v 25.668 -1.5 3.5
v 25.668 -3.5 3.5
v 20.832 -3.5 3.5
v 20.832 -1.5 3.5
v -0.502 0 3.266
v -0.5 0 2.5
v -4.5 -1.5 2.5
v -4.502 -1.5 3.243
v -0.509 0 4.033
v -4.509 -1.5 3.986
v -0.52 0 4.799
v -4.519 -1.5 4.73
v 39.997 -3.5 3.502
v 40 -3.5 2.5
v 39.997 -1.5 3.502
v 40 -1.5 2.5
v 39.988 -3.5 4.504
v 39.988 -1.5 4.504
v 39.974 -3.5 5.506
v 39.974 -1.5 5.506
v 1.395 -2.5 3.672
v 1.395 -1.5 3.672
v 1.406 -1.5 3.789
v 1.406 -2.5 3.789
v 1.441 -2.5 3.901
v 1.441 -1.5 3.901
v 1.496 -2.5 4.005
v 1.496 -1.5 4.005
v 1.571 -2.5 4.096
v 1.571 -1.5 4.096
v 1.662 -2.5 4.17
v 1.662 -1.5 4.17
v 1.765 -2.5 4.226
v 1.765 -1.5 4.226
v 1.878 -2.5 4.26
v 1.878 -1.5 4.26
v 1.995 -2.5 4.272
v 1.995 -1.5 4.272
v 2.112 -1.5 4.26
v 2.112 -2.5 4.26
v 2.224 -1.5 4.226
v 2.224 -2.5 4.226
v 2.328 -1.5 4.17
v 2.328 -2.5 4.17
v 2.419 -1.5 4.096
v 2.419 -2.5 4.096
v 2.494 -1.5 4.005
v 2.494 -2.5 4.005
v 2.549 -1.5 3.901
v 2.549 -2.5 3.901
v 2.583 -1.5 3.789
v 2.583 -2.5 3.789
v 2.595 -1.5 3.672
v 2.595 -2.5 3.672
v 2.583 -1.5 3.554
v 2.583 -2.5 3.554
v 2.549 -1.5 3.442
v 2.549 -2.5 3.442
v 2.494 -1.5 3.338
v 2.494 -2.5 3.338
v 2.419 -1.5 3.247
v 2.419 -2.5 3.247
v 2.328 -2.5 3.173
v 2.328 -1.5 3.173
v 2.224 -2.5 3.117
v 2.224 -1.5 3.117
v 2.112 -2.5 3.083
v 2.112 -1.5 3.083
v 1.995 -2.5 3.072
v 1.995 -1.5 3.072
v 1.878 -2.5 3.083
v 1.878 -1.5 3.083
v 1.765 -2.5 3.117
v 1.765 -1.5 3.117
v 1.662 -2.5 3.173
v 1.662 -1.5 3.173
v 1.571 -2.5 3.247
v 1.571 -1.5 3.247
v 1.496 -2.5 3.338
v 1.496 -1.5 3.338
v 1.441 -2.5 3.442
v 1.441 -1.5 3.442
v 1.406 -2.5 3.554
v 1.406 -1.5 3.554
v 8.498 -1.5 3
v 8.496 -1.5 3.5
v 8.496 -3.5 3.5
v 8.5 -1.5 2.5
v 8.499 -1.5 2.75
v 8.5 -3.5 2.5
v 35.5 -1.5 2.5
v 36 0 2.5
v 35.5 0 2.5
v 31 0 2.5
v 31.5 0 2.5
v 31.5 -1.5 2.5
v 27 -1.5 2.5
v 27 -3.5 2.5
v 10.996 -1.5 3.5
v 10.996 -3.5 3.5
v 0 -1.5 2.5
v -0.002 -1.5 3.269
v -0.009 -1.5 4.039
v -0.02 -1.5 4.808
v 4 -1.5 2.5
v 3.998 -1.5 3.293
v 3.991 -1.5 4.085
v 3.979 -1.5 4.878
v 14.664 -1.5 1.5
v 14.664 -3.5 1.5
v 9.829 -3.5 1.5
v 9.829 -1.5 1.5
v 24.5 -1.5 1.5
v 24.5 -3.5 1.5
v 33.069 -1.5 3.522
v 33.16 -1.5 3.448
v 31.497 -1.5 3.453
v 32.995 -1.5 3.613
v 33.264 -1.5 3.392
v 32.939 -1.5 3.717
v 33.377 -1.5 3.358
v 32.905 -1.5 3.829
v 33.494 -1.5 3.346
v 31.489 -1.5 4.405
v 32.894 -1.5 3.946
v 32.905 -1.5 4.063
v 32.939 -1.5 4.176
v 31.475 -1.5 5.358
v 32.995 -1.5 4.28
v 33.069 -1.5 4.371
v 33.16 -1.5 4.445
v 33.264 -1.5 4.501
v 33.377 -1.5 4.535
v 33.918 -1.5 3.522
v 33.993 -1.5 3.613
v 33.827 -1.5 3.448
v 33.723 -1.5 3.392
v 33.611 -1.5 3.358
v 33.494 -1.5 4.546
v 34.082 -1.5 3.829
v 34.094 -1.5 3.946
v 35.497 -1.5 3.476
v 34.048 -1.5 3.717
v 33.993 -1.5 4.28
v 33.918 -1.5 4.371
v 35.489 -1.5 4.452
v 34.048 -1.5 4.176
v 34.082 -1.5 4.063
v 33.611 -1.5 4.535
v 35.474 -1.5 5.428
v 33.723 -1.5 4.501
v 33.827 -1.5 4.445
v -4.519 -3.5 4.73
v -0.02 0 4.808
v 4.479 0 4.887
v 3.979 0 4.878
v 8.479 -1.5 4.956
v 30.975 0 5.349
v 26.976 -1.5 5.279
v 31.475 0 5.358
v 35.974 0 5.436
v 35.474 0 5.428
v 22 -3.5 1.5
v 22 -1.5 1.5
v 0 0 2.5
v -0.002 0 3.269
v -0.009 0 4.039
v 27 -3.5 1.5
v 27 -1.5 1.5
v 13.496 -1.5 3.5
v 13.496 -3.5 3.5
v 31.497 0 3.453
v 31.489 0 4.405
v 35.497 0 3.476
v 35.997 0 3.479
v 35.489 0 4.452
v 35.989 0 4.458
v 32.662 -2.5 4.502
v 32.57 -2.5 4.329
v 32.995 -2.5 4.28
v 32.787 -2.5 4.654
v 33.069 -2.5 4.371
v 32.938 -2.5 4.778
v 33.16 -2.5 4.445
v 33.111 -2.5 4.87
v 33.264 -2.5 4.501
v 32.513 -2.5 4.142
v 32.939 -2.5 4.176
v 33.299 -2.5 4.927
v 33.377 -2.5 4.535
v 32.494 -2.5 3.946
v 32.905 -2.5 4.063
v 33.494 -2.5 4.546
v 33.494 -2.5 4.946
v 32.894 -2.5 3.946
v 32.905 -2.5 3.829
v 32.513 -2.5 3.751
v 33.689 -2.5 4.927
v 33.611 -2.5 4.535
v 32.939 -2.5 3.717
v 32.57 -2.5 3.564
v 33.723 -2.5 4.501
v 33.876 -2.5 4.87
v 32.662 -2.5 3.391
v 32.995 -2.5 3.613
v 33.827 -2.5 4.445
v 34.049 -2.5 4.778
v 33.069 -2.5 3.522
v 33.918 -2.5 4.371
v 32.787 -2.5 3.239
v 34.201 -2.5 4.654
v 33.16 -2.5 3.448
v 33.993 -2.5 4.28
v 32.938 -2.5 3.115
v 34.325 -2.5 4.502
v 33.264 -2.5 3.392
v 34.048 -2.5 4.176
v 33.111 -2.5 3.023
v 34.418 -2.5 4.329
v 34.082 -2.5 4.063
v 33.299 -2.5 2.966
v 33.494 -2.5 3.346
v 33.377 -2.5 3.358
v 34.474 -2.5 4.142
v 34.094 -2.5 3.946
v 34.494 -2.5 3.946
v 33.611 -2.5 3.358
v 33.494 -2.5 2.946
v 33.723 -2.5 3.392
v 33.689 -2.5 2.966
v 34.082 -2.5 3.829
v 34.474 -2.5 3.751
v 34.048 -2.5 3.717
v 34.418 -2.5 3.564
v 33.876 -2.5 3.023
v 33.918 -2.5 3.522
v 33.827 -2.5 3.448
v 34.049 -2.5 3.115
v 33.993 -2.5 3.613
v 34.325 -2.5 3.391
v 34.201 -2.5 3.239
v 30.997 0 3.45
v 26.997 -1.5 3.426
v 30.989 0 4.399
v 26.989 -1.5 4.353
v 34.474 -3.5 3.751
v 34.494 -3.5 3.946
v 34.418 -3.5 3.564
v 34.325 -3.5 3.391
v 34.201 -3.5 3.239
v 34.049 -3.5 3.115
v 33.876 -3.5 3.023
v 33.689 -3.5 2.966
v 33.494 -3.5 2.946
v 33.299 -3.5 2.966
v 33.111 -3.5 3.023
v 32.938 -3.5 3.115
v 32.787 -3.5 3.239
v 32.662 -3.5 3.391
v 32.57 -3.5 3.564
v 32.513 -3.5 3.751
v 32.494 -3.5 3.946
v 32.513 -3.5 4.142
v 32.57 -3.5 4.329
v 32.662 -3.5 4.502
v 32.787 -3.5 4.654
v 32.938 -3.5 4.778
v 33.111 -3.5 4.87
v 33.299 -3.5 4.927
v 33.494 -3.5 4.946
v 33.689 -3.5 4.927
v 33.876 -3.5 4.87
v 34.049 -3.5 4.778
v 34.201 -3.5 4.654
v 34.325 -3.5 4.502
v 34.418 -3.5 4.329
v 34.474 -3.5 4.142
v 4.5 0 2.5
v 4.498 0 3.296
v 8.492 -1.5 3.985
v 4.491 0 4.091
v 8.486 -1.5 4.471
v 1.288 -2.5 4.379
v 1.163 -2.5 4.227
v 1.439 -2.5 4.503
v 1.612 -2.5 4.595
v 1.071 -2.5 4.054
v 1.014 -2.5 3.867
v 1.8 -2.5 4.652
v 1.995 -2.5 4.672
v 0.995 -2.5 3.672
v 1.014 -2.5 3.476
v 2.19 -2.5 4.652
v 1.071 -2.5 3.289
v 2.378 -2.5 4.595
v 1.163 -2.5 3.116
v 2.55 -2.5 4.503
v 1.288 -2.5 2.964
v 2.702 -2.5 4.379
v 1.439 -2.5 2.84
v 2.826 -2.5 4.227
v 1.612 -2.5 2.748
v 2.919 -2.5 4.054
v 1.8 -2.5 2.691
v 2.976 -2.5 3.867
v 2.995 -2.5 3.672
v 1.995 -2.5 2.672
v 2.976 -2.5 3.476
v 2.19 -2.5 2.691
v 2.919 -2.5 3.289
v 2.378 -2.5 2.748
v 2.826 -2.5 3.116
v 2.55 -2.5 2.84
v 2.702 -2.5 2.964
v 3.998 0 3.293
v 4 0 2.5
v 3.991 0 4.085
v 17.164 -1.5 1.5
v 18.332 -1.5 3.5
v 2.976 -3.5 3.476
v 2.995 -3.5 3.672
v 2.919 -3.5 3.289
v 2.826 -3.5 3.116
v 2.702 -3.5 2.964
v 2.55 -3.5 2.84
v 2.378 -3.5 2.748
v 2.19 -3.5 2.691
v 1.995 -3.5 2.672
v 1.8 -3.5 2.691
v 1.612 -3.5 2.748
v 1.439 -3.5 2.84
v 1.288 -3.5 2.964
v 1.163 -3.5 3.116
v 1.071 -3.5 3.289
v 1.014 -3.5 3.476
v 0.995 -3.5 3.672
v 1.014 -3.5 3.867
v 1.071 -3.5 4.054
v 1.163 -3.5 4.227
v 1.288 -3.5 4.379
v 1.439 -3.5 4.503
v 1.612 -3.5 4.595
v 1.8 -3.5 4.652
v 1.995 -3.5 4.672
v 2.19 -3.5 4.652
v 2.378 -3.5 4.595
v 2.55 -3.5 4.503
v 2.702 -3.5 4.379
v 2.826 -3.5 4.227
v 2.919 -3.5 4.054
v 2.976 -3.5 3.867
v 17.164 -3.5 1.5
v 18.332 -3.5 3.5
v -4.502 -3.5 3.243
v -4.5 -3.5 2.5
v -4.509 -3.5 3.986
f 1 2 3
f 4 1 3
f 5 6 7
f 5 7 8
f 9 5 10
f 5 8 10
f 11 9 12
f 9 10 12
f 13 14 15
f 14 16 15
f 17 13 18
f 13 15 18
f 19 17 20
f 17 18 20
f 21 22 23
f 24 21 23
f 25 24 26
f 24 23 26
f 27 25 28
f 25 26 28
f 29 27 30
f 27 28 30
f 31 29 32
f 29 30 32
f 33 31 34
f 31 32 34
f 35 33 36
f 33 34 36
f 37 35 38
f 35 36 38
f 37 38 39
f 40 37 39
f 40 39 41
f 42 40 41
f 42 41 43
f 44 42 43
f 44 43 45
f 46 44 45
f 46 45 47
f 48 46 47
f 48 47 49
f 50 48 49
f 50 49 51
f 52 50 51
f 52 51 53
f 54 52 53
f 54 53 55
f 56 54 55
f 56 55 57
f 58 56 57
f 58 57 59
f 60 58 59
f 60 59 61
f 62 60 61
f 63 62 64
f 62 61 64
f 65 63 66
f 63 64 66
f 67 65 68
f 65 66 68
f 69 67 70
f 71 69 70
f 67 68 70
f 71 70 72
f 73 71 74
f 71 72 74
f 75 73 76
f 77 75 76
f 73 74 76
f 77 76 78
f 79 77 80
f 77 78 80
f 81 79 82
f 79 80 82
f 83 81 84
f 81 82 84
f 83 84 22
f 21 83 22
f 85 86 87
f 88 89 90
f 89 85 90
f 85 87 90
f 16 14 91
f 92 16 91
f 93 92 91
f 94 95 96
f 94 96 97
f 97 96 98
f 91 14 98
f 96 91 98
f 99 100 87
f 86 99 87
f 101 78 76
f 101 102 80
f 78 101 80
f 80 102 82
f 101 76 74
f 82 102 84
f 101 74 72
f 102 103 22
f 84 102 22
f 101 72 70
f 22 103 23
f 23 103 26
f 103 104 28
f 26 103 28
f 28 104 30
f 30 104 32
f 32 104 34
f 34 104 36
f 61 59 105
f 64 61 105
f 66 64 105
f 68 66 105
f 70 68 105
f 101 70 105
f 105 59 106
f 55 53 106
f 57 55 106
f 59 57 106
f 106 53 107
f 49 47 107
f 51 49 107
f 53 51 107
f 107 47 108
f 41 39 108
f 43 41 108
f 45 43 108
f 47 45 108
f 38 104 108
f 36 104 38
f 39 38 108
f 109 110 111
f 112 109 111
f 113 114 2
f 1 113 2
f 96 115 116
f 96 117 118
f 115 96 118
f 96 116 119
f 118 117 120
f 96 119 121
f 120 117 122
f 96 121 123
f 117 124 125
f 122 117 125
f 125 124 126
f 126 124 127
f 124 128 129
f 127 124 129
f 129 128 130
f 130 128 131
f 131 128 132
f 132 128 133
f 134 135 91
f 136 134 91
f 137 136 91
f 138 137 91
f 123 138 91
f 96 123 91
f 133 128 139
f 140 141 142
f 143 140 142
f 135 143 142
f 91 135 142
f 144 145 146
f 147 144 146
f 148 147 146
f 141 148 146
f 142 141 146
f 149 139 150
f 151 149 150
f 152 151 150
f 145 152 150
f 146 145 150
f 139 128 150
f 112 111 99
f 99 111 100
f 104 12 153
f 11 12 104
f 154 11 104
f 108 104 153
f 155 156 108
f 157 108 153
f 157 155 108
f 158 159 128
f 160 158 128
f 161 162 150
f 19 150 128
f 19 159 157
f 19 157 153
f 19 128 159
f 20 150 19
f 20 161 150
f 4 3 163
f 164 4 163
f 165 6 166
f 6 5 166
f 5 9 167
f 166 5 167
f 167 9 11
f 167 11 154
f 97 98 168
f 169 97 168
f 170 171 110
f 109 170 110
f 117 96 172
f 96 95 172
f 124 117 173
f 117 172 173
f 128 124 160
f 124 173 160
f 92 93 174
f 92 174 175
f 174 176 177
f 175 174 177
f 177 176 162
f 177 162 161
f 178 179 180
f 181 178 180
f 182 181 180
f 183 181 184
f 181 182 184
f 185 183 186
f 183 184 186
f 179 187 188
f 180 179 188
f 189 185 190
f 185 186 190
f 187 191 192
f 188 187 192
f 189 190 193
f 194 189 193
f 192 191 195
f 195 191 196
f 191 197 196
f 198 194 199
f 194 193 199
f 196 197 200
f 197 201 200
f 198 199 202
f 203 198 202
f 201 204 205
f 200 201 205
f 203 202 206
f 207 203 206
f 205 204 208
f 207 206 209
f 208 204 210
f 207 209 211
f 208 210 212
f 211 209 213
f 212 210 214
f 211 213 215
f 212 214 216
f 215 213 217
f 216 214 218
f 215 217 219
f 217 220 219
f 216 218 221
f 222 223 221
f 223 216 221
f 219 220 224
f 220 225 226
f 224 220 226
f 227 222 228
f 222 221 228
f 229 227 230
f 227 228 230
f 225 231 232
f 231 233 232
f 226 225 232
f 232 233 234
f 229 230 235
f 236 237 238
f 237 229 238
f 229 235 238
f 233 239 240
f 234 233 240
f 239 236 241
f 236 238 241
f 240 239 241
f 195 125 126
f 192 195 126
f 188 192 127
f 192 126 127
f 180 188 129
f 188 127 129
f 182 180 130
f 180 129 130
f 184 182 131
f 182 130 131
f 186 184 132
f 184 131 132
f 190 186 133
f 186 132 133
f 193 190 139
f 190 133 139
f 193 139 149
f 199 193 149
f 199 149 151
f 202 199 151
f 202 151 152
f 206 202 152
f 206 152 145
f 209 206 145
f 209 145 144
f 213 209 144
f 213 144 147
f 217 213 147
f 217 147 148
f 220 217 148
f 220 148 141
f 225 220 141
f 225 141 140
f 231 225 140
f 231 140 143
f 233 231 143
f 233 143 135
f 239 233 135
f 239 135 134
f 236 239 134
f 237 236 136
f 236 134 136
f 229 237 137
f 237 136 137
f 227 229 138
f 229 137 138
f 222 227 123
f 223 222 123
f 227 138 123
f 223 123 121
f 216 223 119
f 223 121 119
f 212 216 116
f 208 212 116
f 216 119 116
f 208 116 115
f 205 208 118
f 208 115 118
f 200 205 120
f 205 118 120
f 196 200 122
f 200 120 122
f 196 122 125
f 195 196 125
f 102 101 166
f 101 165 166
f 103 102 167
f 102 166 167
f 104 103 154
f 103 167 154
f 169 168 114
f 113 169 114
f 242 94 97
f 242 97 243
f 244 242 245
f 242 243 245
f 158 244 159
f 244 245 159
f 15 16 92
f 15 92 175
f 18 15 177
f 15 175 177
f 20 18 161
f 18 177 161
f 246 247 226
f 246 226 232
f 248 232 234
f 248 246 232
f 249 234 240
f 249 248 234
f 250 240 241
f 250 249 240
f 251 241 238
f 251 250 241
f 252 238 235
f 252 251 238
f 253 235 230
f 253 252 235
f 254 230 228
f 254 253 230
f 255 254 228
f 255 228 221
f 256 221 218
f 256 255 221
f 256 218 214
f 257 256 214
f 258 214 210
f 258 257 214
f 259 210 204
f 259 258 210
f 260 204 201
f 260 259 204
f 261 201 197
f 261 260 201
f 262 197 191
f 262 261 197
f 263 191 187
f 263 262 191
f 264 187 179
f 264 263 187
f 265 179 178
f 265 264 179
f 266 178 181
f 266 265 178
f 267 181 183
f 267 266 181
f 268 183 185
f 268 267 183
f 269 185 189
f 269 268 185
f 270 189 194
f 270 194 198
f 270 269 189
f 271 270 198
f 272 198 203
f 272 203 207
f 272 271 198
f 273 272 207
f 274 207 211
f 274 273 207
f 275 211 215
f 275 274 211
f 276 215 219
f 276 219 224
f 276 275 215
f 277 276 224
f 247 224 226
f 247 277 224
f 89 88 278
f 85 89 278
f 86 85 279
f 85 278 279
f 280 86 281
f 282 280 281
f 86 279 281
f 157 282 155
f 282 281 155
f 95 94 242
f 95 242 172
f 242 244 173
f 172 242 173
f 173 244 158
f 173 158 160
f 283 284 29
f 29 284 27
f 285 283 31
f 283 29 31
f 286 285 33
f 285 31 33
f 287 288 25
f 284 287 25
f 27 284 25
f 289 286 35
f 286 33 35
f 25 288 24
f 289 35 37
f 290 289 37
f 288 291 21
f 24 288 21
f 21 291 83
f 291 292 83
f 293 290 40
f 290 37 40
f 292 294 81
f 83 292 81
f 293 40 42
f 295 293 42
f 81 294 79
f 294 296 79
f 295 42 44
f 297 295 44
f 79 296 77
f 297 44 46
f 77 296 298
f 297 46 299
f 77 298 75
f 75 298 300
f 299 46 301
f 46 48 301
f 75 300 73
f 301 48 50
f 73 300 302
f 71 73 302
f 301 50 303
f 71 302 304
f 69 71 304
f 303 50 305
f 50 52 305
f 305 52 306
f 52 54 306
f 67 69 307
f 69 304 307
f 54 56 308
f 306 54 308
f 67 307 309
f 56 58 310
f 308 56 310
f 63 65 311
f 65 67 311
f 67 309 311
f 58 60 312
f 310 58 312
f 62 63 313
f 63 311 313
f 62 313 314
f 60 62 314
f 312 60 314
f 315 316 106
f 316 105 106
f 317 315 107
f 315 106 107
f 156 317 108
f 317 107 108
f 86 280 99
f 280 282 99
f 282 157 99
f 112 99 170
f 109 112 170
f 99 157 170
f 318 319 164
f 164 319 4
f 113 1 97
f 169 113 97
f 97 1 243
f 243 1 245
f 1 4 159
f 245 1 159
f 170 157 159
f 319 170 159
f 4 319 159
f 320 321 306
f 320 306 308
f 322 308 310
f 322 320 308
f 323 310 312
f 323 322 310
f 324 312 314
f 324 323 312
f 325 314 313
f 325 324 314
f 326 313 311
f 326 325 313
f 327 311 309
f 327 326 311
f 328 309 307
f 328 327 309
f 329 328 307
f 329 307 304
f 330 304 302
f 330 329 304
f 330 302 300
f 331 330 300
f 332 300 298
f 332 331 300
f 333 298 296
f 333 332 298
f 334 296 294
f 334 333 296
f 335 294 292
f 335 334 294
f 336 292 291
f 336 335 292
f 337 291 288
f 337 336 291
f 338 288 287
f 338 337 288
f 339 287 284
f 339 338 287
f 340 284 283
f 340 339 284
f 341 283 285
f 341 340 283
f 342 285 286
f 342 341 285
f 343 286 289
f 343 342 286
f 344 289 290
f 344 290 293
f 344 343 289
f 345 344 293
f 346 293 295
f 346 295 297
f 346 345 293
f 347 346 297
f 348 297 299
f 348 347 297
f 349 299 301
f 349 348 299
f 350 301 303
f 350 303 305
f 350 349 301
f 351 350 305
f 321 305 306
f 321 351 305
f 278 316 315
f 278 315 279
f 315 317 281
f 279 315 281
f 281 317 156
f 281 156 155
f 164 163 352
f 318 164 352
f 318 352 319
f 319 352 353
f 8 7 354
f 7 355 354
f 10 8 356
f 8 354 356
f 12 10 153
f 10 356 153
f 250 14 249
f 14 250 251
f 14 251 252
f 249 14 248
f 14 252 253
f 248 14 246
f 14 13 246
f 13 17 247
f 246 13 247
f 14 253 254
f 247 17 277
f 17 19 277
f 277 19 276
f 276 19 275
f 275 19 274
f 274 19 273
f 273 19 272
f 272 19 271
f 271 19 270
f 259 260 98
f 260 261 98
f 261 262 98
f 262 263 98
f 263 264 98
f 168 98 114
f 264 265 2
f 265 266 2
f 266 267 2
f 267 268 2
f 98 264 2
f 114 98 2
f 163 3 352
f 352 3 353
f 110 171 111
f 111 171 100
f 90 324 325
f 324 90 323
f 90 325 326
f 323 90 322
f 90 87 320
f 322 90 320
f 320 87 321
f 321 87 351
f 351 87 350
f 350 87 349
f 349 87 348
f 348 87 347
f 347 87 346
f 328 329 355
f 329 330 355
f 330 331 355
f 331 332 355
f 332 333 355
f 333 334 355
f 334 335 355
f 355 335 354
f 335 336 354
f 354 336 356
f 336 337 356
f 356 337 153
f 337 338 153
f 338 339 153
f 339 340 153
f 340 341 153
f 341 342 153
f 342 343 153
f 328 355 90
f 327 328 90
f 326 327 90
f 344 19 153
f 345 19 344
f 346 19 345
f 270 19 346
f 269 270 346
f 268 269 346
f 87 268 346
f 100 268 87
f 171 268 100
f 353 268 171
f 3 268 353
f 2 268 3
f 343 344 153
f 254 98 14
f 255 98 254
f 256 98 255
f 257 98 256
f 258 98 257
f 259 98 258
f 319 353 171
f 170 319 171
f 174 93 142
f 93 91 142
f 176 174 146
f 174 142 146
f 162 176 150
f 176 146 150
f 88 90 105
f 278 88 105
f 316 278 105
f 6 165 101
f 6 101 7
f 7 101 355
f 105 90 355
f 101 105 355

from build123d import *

# Parameters (mm, degrees)
EXTRUDE_1_DEPTH          = 2.5
SKETCH_5_R               = 0.6
CUT_EXTRUDE_1_DEPTH      = 19.036421485
CUT_EXTRUDE_START        = -2
SKETCH_5_3_R             = 1
CUT_EXTRUDE_2_DEPTH      = 1
REVOLVE_1_ANGLE          = 1
SKETCH_9_R               = 0.6
CUT_EXTRUDE_3_DEPTH      = 41.426698916
SKETCH_9_3_R             = 1
CUT_EXTRUDE_4_DEPTH      = 1
CUT_EXTRUDE_9_DEPTH      = 41.426698916
CUT_EXTRUDE_9_DEPTH_BACK = 41.426698916


with BuildPart() as part:
    # 草图4 → 凸台-拉伸1 (new body)
    with BuildSketch(Plane.XY):
        Polygon((8.5, -1.5), (17.75, -1.5), (17.75, -3.5), (-4.5, -3.5), (-4.5, -1.5), (-0.5, 0), (0, 0), (0, -1.5), (4, -1.5), (4, 0), (4.5, 0), align=None)
    extrude(amount=EXTRUDE_1_DEPTH)

    # 草图5 → 切除-拉伸1 (cut, through all)
    with BuildSketch(Plane(origin=(0, -1.5, 0), x_dir=(1, 0, 0), z_dir=(0, 1, 0))):
        with Locations(Location((2, -1.25, 0), (0, 0, 270))):
            Circle(SKETCH_5_R)
    extrude(amount=-CUT_EXTRUDE_1_DEPTH, mode=Mode.SUBTRACT)

    # 草图5<3> → 切除-拉伸2 (cut)
    with BuildSketch(Plane(origin=(0, -1.5, 0), x_dir=(1, 0, 0), z_dir=(0, 1, 0)).offset(CUT_EXTRUDE_START)):
        with Locations((2, -1.25)):
            Circle(SKETCH_5_3_R)
    extrude(amount=CUT_EXTRUDE_2_DEPTH, mode=Mode.SUBTRACT)

    # 镜向1: part across plane


with BuildPart() as part_1:
    add(part.part)
    add(part.part.mirror(Plane(origin=(17.75, 0, 2.5), x_dir=(0, 0, 1), z_dir=(1, 0, 0))))

    # 草图6 → 旋转1 (revolve)
    with BuildSketch(Plane.XY.offset(2.5)):
        Polygon((0, 0), (-0.5, 0), (-4.5, -1.5), (-4.5, -3.5), (40, -3.5), (40, -1.5), (36, 0), (35.5, 0), (35.5, -1.5), (31.5, -1.5), (31.5, 0), (31, 0), (27, -1.5), (8.5, -1.5), (4.5, 0), (4, 0), (4, -1.5), (0, -1.5), align=None)
    revolve(axis=Axis((-132.25, 94.8535776, 2.5), (0, -1, 0)), revolution_arc=REVOLVE_1_ANGLE)

    # 草图9 → 切除-拉伸3 (cut, through all)
    with BuildSketch(Plane(origin=(0, -1.5, 0), x_dir=(1, 0, 0), z_dir=(0, 1, 0))):
        with Locations(Location((1.994888171, -3.671537391, 0), (0, 0, 180))):
            Circle(SKETCH_9_R)
        with Locations(Location((33.493688748, -3.946423259, 0), (0, 0, 180))):
            Circle(SKETCH_9_R)
    extrude(amount=-CUT_EXTRUDE_3_DEPTH, mode=Mode.SUBTRACT)

    # 草图9<3> → 切除-拉伸4 (cut)
    with BuildSketch(Plane(origin=(0, -1.5, 0), x_dir=(1, 0, 0), z_dir=(0, 1, 0)).offset(CUT_EXTRUDE_START)):
        with Locations((1.994888171, -3.671537391)):
            Circle(SKETCH_9_3_R)
        with Locations((33.493688748, -3.946423259)):
            Circle(SKETCH_9_3_R)
    extrude(amount=CUT_EXTRUDE_4_DEPTH, mode=Mode.SUBTRACT)

    # 草图10 → 切除-拉伸9 (cut, two sides: drawn at the far end of the back side and taken through both)
    with BuildSketch(Plane(origin=(0, -1.5, 0), x_dir=(1, 0, 0), z_dir=(0, 1, 0)).offset(-CUT_EXTRUDE_9_DEPTH_BACK)):
        Polygon((27, -2.5), (27, -1.5), (24.5, -1.5), (25.667850814, -3.5), (20.832149186, -3.5), (22, -1.5), (17.164298372, -1.5), (18.332149186, -3.5), (13.496447557, -3.5), (14.664298372, -1.5), (9.828596743, -1.5), (10.996447557, -3.5), (8.496447557, -3.5), (8.5, -2.5), (-4.5, -2.5), (-4.5, 0), (40, 0), (40, -2.5), align=None)
    extrude(amount=CUT_EXTRUDE_9_DEPTH + CUT_EXTRUDE_9_DEPTH_BACK, mode=Mode.SUBTRACT)


solid = part_1.part
